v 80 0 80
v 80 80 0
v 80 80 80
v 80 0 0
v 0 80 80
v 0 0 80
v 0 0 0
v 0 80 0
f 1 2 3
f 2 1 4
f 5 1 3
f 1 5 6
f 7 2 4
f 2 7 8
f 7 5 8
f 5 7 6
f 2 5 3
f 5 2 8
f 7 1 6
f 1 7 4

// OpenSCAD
// file: shared.scad
size = 80;

edges = [
    [ size / 2, 0, 0 ],
    [ size, size / 2, 0 ],
    [ size / 2, size, 0 ],
    [ 0, size / 2, 0 ],
    [ size / 2, 0, size ],
    [ size, size / 2, size ],
    [ size / 2, size, size ],
    [ 0, size / 2, size ],
    [ 0, 0, size / 2 ],
    [ size, 0, size / 2 ],
    [ size, size, size / 2 ],
    [ 0, size, size / 2 ],
];

corners = [
    [ 0, 0, 0 ],
    [ size, 0, 0 ],
    [ size, size, 0 ],
    [ 0, size, 0 ],
    [ 0, 0, size ],
    [ size, 0, size ],
    [ size, size, size ],
    [ 0, size, size ],
];

edges_and_corners = concat(edges, corners);

// label the edges
// We are adjusting the labels by custom offsets and rotations.
translate(edges[0] + [ 0, 0, -5 ]) rotate([ 90, 0, 0 ]) text("E0", size = 5);
translate(edges[1] + [ 0, -3, -5 ]) rotate([ 90, 0, 90 ]) text("E1", size = 5);
translate(edges[2] + [ 5, 0, -5 ]) rotate([ 90, 0, 180 ]) text("E2", size = 5);
translate(edges[3] + [ 0, 0, -5 ]) rotate([ 90, 0, -90 ]) text("E3", size = 5);
translate(edges[4] + [ 0, 0, 2 ]) rotate([ 90, 0, 0 ]) text("E4", size = 5);
translate(edges[5] + [ 0, -3, 2 ]) rotate([ 90, 0, 90 ]) text("E5", size = 5);
translate(edges[6] + [ 5, 0, 2 ]) rotate([ 90, 0, 180 ]) text("E6", size = 5);
translate(edges[7] + [ 0, 3, 2 ]) rotate([ 90, 0, -90 ]) text("E7", size = 5);
translate(edges[8] + [ -1, 0, 0 ]) rotate([ 0, -90, 90 ]) text("E8", size = 5);
translate(edges[9] + [ 5, 0, 0 ]) rotate([ 90, -90, 0 ]) text("E9", size = 5);
translate(edges[10] + [ 1, 0, 0 ]) rotate([ 180, -90, 90 ]) text("E10", size = 5);
translate(edges[11] + [ -1, 0, 0 ]) rotate([ 0, -90, 0 ]) text("E11", size = 5);

// label the corner points
// We are adjusting the labels by custom offsets and rotations.
translate(corners[0] + [ 0, 0, -5 ]) rotate([ 90, 0, 0 ]) text("C12", size = 5);
translate(corners[1] + [ 0, 0, -5 ]) rotate([ 90, 0, 0 ]) text("C13", size = 5);
translate(corners[2] + [ 0, 0, -5 ]) rotate([ 90, 0, 180 ]) text("C14", size = 5);
translate(corners[3] + [ 0, 0, -5 ]) rotate([ 90, 0, 180 ]) text("C15", size = 5);
translate(corners[4]) rotate([ 90, 0, 0 ]) text("C16", size = 5);
translate(corners[5]) rotate([ 90, 0, 0 ]) text("C17", size = 5);
translate(corners[6]) rotate([ 90, 0, 180 ]) text("C18", size = 5);
translate(corners[7]) rotate([ 90, 0, 180 ]) text("C19", size = 5);

module draw_triangles(triangle_table)
{
    for (i = [0:len(triangle_table) - 1])
    {
        indices = triangle_table[i];

        p0 = edges[indices[0]];
        p1 = edges[indices[1]];
        p2 = edges[indices[2]];

        color([ 1, 1, 1, 0.4 ]) polyhedron(points = [ p0, p1, p2 ], faces = [[ 0, 1, 2 ]]);
        echo("Draw triangle: ", indices[0], indices[1], indices[2]);
    }
}

module create_tetrahedra(tetrahedron_table)
{
    for (i = [0:len(tetrahedron_table) - 1])
    {
        indices = tetrahedron_table[i];

        echo("**RESULT tetrahedron ", i, " indices: ", indices);

        p0 = edges_and_corners[indices[0]];
        p1 = edges_and_corners[indices[1]];
        p2 = edges_and_corners[indices[2]];
        p3 = edges_and_corners[indices[3]];

        color([ 1, 0, 0, 0.5 ])
            polyhedron(points = [ p0, p1, p2, p3 ], faces = [ [ 0, 1, 2 ], [ 0, 2, 3 ], [ 0, 3, 1 ], [ 1, 2, 3 ] ]);
    }
}
// main file
include <shared.scad>;

triangle_table = [
    [ 0, 1, 9 ],
];

draw_triangles(triangle_table);

tetrahedron_table = [
    [ 13, 1, 0, 9 ],
];

create_tetrahedra(tetrahedron_table);

color([ 1, 1, 1, 0.2 ]) cube(size, center = false);
